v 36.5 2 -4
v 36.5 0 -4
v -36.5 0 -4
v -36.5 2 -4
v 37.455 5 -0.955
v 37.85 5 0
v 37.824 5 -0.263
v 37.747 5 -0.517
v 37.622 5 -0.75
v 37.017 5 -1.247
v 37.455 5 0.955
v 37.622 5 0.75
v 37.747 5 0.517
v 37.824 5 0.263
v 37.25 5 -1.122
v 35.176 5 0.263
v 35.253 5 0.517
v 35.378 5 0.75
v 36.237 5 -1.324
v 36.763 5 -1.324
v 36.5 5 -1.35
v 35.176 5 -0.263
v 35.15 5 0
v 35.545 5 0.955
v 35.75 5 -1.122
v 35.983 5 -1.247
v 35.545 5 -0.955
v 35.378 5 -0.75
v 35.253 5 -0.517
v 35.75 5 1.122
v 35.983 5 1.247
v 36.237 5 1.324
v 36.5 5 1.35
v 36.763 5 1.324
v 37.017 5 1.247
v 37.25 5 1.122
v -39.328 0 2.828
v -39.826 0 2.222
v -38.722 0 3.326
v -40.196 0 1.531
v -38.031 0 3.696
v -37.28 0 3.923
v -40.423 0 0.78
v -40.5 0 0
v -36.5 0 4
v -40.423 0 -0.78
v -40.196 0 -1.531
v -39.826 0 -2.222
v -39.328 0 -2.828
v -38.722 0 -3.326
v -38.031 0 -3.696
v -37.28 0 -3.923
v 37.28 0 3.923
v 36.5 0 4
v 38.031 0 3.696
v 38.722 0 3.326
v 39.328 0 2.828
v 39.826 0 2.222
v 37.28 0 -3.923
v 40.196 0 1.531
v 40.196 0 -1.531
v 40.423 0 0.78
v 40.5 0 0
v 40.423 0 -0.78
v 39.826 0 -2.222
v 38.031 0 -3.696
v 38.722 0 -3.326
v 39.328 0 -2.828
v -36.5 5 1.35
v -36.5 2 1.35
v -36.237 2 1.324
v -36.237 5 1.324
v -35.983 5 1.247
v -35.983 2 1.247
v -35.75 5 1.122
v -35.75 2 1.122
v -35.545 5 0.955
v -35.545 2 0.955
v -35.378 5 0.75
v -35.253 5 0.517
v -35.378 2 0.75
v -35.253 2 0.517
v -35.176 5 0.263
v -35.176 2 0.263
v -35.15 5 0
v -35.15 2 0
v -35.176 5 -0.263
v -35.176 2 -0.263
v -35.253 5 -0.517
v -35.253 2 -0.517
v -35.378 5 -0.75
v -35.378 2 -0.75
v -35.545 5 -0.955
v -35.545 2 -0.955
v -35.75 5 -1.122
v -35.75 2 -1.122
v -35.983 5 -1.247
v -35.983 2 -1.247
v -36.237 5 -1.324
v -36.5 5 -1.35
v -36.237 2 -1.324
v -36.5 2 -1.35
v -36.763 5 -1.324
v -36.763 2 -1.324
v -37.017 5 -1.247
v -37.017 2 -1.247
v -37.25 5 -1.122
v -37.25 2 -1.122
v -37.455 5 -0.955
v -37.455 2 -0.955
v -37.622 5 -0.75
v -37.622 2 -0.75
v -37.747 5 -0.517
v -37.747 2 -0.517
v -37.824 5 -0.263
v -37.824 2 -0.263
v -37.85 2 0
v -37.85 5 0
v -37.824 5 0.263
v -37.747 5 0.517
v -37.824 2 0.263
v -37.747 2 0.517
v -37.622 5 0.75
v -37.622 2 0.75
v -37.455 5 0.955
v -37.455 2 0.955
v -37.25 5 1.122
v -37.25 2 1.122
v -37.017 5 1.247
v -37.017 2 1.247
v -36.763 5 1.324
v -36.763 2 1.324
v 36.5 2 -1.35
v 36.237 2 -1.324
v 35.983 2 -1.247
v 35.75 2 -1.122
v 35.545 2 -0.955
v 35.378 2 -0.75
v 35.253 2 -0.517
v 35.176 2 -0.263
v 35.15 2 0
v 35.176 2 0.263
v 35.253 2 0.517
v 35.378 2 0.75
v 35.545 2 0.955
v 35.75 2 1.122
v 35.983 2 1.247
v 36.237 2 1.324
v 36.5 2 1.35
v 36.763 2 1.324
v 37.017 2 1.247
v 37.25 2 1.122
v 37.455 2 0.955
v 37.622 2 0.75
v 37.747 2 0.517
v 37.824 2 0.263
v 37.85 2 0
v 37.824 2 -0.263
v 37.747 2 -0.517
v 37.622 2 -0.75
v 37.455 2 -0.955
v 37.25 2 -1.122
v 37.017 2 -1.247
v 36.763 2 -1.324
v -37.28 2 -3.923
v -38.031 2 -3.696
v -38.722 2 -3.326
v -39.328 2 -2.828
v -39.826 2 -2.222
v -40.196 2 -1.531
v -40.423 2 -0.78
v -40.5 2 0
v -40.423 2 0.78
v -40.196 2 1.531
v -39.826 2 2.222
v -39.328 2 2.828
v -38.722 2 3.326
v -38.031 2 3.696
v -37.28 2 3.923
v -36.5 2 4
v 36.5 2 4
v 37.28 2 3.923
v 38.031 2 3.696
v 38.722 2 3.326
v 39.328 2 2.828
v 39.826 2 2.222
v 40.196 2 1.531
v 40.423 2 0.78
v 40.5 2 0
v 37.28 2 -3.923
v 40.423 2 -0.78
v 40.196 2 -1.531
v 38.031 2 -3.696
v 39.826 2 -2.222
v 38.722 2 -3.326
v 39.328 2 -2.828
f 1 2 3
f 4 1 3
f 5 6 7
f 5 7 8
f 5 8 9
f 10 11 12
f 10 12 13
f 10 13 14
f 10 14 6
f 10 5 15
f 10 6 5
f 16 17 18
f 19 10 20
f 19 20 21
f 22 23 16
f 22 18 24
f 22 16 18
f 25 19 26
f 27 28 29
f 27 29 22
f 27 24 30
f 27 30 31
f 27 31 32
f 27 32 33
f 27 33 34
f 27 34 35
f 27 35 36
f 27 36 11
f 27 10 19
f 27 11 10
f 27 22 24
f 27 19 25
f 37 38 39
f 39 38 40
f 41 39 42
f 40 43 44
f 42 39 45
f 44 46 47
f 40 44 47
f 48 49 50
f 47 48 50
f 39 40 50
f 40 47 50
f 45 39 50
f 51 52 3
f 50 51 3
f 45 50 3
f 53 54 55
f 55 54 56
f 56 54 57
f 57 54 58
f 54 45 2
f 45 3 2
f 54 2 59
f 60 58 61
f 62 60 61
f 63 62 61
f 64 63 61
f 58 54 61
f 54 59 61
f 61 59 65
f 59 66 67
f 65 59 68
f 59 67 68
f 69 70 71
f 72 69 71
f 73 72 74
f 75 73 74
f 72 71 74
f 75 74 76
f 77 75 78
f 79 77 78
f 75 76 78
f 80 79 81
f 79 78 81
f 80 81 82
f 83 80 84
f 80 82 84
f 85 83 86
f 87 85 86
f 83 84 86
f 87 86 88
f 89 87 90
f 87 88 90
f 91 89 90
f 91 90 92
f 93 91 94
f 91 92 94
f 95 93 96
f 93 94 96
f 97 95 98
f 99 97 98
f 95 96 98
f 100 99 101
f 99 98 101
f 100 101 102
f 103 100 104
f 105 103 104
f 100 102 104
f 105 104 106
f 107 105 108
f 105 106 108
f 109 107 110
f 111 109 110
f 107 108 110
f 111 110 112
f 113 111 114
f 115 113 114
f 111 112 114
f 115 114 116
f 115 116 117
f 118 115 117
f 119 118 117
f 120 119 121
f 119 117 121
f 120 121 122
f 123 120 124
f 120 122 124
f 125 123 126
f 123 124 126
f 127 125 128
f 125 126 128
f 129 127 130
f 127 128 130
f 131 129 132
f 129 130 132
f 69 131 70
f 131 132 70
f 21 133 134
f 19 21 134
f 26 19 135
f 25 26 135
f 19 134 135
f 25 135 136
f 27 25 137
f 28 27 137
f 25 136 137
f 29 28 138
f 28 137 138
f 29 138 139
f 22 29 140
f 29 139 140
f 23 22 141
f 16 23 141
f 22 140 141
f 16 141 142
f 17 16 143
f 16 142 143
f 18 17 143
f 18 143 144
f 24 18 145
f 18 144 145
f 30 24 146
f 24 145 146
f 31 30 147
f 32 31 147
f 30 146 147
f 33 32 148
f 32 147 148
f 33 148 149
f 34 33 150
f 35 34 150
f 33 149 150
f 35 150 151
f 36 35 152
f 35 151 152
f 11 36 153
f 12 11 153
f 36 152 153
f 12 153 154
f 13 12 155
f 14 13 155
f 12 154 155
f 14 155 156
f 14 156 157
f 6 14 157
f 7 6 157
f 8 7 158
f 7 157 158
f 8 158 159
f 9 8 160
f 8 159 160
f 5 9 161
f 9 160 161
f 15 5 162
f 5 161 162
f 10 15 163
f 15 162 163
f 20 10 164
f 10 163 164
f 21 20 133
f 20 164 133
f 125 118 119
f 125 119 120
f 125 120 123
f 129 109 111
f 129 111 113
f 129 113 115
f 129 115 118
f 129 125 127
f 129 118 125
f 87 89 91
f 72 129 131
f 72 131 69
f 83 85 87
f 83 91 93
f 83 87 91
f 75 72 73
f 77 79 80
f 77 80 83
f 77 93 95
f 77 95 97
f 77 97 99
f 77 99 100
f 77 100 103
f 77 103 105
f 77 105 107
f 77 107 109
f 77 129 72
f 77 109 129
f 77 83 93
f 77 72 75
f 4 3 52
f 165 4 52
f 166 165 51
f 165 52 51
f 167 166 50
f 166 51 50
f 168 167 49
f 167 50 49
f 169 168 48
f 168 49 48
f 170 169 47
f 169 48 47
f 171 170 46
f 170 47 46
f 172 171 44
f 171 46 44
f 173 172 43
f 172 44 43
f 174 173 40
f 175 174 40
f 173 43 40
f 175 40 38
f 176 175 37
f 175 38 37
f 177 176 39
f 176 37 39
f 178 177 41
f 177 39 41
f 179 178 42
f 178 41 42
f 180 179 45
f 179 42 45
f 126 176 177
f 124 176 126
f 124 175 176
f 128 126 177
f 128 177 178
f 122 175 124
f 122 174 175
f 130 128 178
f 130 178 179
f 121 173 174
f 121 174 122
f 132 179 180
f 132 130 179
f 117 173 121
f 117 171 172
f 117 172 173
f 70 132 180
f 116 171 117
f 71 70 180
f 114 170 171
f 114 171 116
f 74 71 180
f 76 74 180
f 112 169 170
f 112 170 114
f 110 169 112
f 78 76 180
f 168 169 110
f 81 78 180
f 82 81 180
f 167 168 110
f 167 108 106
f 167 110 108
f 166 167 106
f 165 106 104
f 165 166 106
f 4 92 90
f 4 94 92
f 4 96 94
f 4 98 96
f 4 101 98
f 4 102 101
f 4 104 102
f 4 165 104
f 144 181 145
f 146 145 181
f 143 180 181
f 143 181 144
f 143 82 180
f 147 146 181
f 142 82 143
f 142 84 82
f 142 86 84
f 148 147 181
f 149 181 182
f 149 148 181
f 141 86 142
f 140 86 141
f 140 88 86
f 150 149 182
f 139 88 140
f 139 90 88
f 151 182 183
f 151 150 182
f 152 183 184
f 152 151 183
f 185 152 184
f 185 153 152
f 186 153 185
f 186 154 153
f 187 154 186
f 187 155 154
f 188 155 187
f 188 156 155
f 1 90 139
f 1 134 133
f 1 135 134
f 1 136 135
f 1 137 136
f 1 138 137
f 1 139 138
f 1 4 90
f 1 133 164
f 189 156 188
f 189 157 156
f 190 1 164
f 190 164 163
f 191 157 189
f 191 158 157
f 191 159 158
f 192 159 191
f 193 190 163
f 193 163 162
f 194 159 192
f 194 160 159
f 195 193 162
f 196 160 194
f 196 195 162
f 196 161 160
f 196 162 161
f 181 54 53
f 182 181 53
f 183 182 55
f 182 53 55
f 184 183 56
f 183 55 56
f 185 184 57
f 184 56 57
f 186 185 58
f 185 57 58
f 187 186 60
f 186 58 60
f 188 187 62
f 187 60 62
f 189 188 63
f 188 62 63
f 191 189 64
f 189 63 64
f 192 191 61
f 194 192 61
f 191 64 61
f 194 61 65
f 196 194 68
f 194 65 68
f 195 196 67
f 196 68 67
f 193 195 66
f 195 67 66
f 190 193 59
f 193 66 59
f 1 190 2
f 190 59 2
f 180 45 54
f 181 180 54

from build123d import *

# Parameters (mm, degrees)
BOSS_EXTRUDE1_DEPTH = 2
SKETCH3_R           = 1.35
BOSS_EXTRUDE2_DEPTH = 3


with BuildPart() as part:
    # Sketch2 → Boss-Extrude1 (new body)
    with BuildSketch(Plane(origin=(0, 0, 0), x_dir=(1, 0, 0), z_dir=(0, 1, 0))):
        with BuildLine():
            Line((-36.5, -4), (36.5, -4))
            ThreePointArc((36.5, -4), (40.5, 0), (36.5, 4))
            Line((36.5, 4), (-36.5, 4))
            ThreePointArc((-36.5, 4), (-40.5, 0), (-36.5, -4))
        make_face()
    extrude(amount=BOSS_EXTRUDE1_DEPTH)

    # Sketch3 → Boss-Extrude2 (add)
    with BuildSketch(Plane(origin=(0, 2, 0), x_dir=(1, 0, 0), z_dir=(0, 1, 0))):
        with Locations(Location((-36.5, 0, 0), (0, 0, 270))):
            Circle(SKETCH3_R)
        with Locations(Location((36.5, 0, 0), (0, 0, 90))):
            Circle(SKETCH3_R)
    extrude(amount=BOSS_EXTRUDE2_DEPTH)


solid = part.part
